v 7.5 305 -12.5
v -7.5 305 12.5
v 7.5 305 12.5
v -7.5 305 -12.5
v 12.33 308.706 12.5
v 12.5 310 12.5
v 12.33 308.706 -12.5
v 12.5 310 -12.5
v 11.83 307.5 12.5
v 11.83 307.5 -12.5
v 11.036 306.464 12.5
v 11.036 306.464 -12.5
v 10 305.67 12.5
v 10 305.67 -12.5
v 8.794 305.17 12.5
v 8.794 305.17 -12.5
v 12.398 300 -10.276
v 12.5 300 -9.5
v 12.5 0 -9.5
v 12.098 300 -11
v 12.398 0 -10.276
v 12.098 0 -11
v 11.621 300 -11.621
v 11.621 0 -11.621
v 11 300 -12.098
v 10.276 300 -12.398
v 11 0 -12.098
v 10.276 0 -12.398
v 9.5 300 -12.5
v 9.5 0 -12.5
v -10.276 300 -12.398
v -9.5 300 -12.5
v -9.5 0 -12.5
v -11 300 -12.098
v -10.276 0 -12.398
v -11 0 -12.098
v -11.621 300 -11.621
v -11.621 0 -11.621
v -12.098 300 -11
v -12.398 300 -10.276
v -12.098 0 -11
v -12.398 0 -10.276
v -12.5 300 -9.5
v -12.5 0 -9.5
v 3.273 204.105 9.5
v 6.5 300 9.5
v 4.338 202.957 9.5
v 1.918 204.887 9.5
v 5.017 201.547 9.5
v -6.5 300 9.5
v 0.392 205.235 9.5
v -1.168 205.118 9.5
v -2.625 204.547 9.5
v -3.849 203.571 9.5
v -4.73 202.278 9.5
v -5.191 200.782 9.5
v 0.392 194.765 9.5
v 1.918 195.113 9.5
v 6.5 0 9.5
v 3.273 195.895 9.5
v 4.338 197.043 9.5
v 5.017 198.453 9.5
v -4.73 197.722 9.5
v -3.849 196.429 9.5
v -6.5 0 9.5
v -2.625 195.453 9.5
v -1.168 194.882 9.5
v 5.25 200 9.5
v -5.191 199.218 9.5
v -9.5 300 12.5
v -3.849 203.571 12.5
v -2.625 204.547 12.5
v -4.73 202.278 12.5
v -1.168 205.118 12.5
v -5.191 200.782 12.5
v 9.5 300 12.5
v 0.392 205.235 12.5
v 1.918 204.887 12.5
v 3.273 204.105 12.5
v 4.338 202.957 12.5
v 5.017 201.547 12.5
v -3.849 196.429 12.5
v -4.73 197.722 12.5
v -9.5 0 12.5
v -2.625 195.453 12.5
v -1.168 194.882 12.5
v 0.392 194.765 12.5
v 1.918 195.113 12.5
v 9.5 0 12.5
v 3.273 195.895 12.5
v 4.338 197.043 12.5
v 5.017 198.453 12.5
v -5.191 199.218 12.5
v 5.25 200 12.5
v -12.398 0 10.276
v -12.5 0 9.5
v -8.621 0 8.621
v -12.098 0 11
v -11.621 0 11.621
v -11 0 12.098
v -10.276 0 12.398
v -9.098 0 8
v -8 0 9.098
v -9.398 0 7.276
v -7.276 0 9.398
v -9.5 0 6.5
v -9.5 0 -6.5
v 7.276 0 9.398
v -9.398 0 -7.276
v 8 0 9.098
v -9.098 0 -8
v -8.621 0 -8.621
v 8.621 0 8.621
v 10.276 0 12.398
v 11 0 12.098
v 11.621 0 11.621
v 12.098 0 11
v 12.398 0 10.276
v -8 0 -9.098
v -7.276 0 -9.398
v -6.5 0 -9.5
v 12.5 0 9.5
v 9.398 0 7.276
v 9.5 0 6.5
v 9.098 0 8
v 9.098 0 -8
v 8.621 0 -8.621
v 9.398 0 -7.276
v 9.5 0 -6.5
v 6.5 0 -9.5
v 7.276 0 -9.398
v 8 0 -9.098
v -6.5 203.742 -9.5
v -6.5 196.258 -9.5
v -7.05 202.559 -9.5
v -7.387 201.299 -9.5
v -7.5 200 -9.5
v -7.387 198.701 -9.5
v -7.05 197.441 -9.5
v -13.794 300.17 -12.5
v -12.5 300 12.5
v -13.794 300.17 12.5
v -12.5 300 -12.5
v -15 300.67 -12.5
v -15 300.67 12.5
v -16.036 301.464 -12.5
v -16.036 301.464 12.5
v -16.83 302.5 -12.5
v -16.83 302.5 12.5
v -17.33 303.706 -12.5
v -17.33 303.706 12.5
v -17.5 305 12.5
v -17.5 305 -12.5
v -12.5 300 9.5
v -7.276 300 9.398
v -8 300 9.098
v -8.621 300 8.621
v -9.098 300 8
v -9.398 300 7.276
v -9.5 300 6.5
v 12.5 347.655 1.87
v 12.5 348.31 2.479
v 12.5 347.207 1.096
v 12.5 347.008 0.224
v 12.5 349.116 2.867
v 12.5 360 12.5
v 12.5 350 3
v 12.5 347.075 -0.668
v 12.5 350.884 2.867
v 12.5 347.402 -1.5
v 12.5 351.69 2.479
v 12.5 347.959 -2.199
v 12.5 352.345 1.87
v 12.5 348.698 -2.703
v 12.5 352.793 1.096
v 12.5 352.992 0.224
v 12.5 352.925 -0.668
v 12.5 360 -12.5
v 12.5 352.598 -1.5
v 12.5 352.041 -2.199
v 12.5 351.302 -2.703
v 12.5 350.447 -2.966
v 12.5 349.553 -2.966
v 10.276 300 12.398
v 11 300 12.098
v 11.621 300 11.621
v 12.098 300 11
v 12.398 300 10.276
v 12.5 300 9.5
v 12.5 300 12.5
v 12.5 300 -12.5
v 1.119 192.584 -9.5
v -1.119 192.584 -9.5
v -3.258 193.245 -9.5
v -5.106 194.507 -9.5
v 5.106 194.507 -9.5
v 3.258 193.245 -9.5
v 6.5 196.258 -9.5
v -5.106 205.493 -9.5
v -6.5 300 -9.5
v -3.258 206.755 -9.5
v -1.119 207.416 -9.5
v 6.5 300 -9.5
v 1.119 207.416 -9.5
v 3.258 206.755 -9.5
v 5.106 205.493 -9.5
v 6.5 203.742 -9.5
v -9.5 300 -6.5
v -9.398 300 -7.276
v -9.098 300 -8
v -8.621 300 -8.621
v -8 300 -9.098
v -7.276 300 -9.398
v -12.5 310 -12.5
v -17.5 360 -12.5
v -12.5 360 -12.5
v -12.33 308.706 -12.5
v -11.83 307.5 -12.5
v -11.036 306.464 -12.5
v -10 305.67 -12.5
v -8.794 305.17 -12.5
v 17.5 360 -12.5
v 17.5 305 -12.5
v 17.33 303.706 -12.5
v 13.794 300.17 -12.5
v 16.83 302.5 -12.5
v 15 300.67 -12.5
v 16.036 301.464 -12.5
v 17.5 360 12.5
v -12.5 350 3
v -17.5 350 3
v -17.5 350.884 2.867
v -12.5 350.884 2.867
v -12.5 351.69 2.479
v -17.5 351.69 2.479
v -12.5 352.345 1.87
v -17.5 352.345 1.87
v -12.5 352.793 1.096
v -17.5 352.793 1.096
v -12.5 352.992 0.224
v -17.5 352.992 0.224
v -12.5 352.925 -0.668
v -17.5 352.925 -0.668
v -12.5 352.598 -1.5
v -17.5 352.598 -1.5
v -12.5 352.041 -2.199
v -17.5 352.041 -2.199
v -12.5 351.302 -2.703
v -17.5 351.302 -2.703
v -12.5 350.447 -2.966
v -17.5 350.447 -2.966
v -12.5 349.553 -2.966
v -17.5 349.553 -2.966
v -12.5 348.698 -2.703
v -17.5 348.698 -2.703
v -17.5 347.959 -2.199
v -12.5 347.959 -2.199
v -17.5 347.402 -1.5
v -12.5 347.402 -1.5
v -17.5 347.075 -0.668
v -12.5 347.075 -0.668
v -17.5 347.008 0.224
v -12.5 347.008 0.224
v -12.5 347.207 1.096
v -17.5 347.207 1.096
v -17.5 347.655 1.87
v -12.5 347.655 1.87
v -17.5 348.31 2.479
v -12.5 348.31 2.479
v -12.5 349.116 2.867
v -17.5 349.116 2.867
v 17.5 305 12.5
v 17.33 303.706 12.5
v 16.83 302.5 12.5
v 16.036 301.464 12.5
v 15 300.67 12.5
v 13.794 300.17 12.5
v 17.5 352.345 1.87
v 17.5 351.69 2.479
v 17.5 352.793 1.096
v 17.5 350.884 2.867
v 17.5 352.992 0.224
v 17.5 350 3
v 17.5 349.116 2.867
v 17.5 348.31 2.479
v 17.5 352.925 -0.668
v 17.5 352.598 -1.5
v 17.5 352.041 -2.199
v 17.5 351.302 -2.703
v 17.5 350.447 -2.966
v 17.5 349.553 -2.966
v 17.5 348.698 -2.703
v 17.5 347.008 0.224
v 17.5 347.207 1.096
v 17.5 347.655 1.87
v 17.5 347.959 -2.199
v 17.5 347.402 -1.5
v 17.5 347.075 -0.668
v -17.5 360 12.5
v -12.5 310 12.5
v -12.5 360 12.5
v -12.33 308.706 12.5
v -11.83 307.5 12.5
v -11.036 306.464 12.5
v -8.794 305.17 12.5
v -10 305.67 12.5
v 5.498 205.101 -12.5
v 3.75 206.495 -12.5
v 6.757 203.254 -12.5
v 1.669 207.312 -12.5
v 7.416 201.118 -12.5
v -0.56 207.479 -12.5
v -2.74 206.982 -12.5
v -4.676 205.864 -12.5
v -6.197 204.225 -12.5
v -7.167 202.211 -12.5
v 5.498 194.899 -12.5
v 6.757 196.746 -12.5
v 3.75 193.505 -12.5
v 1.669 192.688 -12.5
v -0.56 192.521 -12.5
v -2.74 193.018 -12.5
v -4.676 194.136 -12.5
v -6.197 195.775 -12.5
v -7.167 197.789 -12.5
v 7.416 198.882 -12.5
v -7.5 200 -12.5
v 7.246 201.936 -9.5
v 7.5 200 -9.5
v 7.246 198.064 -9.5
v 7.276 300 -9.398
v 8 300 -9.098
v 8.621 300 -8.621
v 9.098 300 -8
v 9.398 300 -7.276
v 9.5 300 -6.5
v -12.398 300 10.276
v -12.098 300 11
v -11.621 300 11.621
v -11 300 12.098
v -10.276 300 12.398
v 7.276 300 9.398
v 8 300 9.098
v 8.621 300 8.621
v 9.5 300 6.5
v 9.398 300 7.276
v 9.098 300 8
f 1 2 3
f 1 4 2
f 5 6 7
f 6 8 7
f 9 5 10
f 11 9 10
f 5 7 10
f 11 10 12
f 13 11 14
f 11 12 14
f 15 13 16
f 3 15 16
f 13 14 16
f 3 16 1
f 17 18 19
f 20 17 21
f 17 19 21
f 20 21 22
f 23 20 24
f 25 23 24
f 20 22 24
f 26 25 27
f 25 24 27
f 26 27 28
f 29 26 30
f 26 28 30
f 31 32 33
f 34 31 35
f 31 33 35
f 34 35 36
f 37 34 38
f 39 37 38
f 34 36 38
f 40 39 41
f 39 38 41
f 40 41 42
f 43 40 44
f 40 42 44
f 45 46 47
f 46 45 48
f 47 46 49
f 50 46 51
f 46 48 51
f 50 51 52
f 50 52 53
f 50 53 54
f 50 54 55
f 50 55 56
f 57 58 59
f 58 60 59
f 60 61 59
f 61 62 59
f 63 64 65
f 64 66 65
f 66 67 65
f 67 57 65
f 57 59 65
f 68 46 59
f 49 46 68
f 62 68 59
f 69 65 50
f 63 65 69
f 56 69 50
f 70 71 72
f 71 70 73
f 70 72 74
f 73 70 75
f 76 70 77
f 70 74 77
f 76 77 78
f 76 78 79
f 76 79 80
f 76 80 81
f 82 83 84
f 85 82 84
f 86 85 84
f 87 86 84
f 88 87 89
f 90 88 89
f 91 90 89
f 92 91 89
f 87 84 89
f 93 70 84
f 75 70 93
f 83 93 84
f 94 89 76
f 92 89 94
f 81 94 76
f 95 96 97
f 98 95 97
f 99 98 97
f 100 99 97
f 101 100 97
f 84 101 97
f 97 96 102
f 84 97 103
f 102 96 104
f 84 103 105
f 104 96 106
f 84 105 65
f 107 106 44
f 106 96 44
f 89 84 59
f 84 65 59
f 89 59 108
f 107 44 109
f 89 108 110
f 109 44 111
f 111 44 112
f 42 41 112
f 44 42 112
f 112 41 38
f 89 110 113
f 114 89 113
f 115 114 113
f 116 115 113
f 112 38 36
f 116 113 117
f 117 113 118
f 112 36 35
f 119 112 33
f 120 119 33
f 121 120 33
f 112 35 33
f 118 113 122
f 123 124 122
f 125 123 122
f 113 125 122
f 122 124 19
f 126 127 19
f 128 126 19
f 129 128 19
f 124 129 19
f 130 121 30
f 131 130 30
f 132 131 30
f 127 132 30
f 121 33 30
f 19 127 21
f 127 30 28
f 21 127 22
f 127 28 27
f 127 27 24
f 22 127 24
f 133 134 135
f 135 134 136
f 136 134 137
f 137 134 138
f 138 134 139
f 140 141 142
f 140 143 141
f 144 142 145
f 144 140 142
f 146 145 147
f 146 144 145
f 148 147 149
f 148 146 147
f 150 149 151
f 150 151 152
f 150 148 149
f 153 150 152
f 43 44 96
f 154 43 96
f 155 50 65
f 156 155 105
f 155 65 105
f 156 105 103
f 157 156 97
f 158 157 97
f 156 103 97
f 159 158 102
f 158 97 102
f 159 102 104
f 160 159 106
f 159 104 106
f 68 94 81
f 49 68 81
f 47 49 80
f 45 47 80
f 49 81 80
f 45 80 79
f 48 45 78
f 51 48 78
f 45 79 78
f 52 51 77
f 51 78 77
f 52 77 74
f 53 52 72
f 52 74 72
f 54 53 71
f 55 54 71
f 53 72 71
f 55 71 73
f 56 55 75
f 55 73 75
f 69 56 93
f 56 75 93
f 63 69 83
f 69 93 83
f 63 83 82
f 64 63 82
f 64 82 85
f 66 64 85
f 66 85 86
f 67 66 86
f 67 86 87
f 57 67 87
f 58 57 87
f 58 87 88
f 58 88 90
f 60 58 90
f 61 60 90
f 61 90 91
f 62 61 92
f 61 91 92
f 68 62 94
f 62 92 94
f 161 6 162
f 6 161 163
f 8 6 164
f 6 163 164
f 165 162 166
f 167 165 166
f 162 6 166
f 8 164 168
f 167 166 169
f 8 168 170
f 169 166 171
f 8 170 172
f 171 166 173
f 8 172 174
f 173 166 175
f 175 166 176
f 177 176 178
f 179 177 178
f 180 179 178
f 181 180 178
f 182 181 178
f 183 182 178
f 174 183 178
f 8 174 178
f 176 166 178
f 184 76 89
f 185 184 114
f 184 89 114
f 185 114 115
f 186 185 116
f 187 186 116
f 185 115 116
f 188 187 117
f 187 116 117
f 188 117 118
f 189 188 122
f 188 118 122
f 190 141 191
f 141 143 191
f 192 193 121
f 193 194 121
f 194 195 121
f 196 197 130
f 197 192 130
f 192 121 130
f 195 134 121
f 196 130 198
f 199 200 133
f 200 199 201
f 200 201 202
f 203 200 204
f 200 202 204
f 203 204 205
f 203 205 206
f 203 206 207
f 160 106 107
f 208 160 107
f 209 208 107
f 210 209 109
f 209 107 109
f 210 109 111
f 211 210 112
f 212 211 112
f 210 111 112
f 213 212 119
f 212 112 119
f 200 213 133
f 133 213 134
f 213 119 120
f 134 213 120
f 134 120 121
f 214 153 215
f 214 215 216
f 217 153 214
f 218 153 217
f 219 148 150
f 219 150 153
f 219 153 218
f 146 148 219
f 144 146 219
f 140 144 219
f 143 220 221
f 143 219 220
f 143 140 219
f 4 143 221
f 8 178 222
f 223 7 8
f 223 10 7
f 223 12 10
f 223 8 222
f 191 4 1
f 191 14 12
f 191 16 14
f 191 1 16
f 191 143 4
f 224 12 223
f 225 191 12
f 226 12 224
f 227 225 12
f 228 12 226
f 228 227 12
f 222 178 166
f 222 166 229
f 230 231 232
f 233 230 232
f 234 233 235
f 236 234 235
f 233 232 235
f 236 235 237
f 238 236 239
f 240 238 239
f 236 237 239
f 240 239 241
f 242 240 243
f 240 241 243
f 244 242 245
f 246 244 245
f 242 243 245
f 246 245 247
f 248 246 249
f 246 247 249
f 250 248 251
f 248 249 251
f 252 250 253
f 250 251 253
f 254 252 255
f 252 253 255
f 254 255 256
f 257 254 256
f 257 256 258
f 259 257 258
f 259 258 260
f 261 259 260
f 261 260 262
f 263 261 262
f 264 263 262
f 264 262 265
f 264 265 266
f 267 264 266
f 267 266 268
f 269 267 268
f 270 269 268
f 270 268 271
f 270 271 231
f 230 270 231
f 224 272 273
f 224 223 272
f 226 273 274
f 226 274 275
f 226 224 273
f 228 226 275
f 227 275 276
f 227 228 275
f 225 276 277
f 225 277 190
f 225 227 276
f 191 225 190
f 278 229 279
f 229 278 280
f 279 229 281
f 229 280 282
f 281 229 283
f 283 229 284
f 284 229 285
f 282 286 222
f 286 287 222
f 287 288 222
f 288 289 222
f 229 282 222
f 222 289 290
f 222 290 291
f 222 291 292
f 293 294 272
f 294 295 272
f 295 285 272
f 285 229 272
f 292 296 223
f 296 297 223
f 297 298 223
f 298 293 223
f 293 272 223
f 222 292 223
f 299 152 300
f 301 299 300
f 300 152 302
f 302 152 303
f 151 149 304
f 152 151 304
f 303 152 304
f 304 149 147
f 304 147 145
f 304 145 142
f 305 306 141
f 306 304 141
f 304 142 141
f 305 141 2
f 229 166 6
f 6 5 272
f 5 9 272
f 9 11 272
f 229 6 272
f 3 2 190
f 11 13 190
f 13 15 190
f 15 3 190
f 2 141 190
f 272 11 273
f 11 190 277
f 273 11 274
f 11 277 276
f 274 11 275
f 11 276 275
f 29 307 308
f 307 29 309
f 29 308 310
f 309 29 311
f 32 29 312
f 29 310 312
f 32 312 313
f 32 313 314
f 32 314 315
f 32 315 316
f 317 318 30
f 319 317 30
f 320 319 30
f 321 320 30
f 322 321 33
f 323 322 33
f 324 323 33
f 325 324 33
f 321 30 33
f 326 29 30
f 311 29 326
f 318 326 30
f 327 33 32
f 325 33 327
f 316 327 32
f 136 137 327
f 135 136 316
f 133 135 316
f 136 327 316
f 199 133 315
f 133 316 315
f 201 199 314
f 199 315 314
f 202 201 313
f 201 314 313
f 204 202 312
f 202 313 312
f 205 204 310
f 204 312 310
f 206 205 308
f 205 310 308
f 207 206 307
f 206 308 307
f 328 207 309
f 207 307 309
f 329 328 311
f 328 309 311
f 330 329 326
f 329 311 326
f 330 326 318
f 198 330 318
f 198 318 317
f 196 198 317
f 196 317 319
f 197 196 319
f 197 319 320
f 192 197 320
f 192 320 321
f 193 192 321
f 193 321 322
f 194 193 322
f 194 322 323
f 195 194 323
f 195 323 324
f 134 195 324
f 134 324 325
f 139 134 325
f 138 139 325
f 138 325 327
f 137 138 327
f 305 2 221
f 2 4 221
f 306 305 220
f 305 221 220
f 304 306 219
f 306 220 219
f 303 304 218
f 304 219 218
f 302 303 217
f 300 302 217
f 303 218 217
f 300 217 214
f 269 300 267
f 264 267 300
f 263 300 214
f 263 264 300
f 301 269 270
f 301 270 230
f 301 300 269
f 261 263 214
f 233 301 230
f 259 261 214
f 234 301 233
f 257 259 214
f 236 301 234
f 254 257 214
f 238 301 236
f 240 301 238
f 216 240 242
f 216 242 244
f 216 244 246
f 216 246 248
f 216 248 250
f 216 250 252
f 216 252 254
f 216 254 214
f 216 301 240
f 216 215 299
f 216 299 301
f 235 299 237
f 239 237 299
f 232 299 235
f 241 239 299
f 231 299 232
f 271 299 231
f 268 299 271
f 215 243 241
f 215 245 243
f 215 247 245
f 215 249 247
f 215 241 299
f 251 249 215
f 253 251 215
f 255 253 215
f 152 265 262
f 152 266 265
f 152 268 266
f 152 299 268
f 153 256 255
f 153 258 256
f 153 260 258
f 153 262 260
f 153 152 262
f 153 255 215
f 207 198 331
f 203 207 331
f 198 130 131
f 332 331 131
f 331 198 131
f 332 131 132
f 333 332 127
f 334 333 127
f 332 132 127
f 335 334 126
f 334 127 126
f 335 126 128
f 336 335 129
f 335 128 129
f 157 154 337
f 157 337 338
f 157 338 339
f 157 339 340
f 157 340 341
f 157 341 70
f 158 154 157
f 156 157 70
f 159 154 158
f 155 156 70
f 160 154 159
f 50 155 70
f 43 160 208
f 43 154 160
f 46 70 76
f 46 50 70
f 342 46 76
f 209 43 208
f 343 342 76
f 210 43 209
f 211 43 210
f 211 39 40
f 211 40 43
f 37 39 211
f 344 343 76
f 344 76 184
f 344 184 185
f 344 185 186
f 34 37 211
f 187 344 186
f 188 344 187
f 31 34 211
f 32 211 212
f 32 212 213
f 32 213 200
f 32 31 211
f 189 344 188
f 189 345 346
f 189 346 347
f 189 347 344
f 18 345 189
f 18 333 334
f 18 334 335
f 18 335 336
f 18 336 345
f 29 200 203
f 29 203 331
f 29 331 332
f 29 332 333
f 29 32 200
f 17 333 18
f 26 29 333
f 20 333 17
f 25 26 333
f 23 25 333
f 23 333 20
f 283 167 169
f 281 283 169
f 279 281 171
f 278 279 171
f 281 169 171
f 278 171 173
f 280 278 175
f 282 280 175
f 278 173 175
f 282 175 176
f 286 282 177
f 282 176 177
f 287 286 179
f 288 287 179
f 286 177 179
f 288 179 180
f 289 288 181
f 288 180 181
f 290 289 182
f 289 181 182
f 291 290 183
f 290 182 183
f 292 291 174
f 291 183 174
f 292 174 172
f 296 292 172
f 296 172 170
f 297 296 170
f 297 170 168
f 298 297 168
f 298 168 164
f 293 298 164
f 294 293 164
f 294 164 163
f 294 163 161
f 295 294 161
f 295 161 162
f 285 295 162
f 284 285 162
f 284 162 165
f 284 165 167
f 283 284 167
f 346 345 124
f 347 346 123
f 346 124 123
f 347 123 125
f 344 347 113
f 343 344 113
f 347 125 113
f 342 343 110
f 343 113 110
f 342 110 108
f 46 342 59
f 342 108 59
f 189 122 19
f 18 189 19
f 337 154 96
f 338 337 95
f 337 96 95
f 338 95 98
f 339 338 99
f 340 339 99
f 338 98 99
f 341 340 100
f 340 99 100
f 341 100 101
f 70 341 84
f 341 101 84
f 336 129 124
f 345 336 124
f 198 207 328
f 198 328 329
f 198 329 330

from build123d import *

# Parameters (mm, degrees)
BOSS_EXTRUDE1_DEPTH = 300
SKETCH2_R           = 7.5
CUT_EXTRUDE1_DEPTH  = 3
SKETCH3_R           = 5.25
CUT_EXTRUDE2_DEPTH  = 3
SKETCH5_W           = 35
SKETCH5_H           = 25
BOSS_EXTRUDE2_DEPTH = 60
SKETCH7_W           = 25
SKETCH7_H           = 25
CUT_EXTRUDE4_DEPTH  = 55
SKETCH8_R           = 3
CUT_EXTRUDE5_DEPTH  = 55
FILLET1_R           = 5
FILLET2_R           = 5


with BuildPart() as part:
    # Sketch1 → Boss-Extrude1 (new body)
    with BuildSketch(Plane(origin=(0, 0, 0), x_dir=(1, 0, 0), z_dir=(0, 1, 0))):
        with BuildLine():
            Line((9.5, 12.5), (-9.5, 12.5))
            ThreePointArc((-9.5, 12.5), (-11.621320344, 11.621320344), (-12.5, 9.5))
            Line((-12.5, 9.5), (-12.5, -9.5))
            ThreePointArc((-12.5, -9.5), (-11.621320344, -11.621320344), (-9.5, -12.5))
            Line((-9.5, -12.5), (9.5, -12.5))
            ThreePointArc((9.5, -12.5), (11.621320344, -11.621320344), (12.5, -9.5))
            Line((12.5, -9.5), (12.5, 9.5))
            ThreePointArc((12.5, 9.5), (11.621320344, 11.621320344), (9.5, 12.5))
        make_face()
        with BuildLine():
            Line((-6.5, 9.5), (6.5, 9.5))
            ThreePointArc((6.5, 9.5), (8.621320344, 8.621320344), (9.5, 6.5))
            Line((9.5, 6.5), (9.5, -6.5))
            ThreePointArc((9.5, -6.5), (8.621320344, -8.621320344), (6.5, -9.5))
            Line((6.5, -9.5), (-6.5, -9.5))
            ThreePointArc((-6.5, -9.5), (-8.621320344, -8.621320344), (-9.5, -6.5))
            Line((-9.5, -6.5), (-9.5, 6.5))
            ThreePointArc((-9.5, 6.5), (-8.621320344, 8.621320344), (-6.5, 9.5))
        make_face(mode=Mode.SUBTRACT)
    extrude(amount=BOSS_EXTRUDE1_DEPTH)

    # Sketch2 → Cut-Extrude1 (cut)
    with BuildSketch(Plane(origin=(0, 0, -12.5), x_dir=(-1, 0, 0), z_dir=(0, 0, -1))):
        with Locations((0, 200)):
            Circle(SKETCH2_R)
    extrude(amount=-CUT_EXTRUDE1_DEPTH, mode=Mode.SUBTRACT)

    # Sketch3 → Cut-Extrude2 (cut)
    with BuildSketch(Plane.XY.offset(12.5)):
        with Locations((0, 200)):
            Circle(SKETCH3_R)
    extrude(amount=-CUT_EXTRUDE2_DEPTH, mode=Mode.SUBTRACT)


with BuildPart() as body_2:
    # Sketch5 → Boss-Extrude2 (new body)
    with BuildSketch(Plane(origin=(0, 300, 0), x_dir=(1, 0, 0), z_dir=(0, 1, 0))):
        Rectangle(SKETCH5_W, SKETCH5_H)
    extrude(amount=BOSS_EXTRUDE2_DEPTH)

    # Sketch7 → Cut-Extrude4 (cut)
    with BuildSketch(Plane(origin=(0, 360, 0), x_dir=(1, 0, 0), z_dir=(0, 1, 0))):
        Rectangle(SKETCH7_W, SKETCH7_H)
    extrude(amount=-CUT_EXTRUDE4_DEPTH, mode=Mode.SUBTRACT)

    # Sketch8 → Cut-Extrude5 (cut)
    with BuildSketch(Plane.ZY.offset(17.5)):
        with Locations((0, 350)):
            Circle(SKETCH8_R)
    extrude(amount=-CUT_EXTRUDE5_DEPTH, mode=Mode.SUBTRACT)

    # Fillet1
    fillet1_edges = [body_2.edges().sort_by_distance(p)[0] for p in [
        (-12.5, 305, 0),
        (12.5, 305, 0),
    ]]
    fillet(fillet1_edges, radius=FILLET1_R)

    # Fillet2
    fillet2_edges = [body_2.edges().sort_by_distance(p)[0] for p in [
        (17.5, 300, 0),
        (-17.5, 300, 0),
    ]]
    fillet(fillet2_edges, radius=FILLET2_R)


solid = Compound([part.part, body_2.part])
